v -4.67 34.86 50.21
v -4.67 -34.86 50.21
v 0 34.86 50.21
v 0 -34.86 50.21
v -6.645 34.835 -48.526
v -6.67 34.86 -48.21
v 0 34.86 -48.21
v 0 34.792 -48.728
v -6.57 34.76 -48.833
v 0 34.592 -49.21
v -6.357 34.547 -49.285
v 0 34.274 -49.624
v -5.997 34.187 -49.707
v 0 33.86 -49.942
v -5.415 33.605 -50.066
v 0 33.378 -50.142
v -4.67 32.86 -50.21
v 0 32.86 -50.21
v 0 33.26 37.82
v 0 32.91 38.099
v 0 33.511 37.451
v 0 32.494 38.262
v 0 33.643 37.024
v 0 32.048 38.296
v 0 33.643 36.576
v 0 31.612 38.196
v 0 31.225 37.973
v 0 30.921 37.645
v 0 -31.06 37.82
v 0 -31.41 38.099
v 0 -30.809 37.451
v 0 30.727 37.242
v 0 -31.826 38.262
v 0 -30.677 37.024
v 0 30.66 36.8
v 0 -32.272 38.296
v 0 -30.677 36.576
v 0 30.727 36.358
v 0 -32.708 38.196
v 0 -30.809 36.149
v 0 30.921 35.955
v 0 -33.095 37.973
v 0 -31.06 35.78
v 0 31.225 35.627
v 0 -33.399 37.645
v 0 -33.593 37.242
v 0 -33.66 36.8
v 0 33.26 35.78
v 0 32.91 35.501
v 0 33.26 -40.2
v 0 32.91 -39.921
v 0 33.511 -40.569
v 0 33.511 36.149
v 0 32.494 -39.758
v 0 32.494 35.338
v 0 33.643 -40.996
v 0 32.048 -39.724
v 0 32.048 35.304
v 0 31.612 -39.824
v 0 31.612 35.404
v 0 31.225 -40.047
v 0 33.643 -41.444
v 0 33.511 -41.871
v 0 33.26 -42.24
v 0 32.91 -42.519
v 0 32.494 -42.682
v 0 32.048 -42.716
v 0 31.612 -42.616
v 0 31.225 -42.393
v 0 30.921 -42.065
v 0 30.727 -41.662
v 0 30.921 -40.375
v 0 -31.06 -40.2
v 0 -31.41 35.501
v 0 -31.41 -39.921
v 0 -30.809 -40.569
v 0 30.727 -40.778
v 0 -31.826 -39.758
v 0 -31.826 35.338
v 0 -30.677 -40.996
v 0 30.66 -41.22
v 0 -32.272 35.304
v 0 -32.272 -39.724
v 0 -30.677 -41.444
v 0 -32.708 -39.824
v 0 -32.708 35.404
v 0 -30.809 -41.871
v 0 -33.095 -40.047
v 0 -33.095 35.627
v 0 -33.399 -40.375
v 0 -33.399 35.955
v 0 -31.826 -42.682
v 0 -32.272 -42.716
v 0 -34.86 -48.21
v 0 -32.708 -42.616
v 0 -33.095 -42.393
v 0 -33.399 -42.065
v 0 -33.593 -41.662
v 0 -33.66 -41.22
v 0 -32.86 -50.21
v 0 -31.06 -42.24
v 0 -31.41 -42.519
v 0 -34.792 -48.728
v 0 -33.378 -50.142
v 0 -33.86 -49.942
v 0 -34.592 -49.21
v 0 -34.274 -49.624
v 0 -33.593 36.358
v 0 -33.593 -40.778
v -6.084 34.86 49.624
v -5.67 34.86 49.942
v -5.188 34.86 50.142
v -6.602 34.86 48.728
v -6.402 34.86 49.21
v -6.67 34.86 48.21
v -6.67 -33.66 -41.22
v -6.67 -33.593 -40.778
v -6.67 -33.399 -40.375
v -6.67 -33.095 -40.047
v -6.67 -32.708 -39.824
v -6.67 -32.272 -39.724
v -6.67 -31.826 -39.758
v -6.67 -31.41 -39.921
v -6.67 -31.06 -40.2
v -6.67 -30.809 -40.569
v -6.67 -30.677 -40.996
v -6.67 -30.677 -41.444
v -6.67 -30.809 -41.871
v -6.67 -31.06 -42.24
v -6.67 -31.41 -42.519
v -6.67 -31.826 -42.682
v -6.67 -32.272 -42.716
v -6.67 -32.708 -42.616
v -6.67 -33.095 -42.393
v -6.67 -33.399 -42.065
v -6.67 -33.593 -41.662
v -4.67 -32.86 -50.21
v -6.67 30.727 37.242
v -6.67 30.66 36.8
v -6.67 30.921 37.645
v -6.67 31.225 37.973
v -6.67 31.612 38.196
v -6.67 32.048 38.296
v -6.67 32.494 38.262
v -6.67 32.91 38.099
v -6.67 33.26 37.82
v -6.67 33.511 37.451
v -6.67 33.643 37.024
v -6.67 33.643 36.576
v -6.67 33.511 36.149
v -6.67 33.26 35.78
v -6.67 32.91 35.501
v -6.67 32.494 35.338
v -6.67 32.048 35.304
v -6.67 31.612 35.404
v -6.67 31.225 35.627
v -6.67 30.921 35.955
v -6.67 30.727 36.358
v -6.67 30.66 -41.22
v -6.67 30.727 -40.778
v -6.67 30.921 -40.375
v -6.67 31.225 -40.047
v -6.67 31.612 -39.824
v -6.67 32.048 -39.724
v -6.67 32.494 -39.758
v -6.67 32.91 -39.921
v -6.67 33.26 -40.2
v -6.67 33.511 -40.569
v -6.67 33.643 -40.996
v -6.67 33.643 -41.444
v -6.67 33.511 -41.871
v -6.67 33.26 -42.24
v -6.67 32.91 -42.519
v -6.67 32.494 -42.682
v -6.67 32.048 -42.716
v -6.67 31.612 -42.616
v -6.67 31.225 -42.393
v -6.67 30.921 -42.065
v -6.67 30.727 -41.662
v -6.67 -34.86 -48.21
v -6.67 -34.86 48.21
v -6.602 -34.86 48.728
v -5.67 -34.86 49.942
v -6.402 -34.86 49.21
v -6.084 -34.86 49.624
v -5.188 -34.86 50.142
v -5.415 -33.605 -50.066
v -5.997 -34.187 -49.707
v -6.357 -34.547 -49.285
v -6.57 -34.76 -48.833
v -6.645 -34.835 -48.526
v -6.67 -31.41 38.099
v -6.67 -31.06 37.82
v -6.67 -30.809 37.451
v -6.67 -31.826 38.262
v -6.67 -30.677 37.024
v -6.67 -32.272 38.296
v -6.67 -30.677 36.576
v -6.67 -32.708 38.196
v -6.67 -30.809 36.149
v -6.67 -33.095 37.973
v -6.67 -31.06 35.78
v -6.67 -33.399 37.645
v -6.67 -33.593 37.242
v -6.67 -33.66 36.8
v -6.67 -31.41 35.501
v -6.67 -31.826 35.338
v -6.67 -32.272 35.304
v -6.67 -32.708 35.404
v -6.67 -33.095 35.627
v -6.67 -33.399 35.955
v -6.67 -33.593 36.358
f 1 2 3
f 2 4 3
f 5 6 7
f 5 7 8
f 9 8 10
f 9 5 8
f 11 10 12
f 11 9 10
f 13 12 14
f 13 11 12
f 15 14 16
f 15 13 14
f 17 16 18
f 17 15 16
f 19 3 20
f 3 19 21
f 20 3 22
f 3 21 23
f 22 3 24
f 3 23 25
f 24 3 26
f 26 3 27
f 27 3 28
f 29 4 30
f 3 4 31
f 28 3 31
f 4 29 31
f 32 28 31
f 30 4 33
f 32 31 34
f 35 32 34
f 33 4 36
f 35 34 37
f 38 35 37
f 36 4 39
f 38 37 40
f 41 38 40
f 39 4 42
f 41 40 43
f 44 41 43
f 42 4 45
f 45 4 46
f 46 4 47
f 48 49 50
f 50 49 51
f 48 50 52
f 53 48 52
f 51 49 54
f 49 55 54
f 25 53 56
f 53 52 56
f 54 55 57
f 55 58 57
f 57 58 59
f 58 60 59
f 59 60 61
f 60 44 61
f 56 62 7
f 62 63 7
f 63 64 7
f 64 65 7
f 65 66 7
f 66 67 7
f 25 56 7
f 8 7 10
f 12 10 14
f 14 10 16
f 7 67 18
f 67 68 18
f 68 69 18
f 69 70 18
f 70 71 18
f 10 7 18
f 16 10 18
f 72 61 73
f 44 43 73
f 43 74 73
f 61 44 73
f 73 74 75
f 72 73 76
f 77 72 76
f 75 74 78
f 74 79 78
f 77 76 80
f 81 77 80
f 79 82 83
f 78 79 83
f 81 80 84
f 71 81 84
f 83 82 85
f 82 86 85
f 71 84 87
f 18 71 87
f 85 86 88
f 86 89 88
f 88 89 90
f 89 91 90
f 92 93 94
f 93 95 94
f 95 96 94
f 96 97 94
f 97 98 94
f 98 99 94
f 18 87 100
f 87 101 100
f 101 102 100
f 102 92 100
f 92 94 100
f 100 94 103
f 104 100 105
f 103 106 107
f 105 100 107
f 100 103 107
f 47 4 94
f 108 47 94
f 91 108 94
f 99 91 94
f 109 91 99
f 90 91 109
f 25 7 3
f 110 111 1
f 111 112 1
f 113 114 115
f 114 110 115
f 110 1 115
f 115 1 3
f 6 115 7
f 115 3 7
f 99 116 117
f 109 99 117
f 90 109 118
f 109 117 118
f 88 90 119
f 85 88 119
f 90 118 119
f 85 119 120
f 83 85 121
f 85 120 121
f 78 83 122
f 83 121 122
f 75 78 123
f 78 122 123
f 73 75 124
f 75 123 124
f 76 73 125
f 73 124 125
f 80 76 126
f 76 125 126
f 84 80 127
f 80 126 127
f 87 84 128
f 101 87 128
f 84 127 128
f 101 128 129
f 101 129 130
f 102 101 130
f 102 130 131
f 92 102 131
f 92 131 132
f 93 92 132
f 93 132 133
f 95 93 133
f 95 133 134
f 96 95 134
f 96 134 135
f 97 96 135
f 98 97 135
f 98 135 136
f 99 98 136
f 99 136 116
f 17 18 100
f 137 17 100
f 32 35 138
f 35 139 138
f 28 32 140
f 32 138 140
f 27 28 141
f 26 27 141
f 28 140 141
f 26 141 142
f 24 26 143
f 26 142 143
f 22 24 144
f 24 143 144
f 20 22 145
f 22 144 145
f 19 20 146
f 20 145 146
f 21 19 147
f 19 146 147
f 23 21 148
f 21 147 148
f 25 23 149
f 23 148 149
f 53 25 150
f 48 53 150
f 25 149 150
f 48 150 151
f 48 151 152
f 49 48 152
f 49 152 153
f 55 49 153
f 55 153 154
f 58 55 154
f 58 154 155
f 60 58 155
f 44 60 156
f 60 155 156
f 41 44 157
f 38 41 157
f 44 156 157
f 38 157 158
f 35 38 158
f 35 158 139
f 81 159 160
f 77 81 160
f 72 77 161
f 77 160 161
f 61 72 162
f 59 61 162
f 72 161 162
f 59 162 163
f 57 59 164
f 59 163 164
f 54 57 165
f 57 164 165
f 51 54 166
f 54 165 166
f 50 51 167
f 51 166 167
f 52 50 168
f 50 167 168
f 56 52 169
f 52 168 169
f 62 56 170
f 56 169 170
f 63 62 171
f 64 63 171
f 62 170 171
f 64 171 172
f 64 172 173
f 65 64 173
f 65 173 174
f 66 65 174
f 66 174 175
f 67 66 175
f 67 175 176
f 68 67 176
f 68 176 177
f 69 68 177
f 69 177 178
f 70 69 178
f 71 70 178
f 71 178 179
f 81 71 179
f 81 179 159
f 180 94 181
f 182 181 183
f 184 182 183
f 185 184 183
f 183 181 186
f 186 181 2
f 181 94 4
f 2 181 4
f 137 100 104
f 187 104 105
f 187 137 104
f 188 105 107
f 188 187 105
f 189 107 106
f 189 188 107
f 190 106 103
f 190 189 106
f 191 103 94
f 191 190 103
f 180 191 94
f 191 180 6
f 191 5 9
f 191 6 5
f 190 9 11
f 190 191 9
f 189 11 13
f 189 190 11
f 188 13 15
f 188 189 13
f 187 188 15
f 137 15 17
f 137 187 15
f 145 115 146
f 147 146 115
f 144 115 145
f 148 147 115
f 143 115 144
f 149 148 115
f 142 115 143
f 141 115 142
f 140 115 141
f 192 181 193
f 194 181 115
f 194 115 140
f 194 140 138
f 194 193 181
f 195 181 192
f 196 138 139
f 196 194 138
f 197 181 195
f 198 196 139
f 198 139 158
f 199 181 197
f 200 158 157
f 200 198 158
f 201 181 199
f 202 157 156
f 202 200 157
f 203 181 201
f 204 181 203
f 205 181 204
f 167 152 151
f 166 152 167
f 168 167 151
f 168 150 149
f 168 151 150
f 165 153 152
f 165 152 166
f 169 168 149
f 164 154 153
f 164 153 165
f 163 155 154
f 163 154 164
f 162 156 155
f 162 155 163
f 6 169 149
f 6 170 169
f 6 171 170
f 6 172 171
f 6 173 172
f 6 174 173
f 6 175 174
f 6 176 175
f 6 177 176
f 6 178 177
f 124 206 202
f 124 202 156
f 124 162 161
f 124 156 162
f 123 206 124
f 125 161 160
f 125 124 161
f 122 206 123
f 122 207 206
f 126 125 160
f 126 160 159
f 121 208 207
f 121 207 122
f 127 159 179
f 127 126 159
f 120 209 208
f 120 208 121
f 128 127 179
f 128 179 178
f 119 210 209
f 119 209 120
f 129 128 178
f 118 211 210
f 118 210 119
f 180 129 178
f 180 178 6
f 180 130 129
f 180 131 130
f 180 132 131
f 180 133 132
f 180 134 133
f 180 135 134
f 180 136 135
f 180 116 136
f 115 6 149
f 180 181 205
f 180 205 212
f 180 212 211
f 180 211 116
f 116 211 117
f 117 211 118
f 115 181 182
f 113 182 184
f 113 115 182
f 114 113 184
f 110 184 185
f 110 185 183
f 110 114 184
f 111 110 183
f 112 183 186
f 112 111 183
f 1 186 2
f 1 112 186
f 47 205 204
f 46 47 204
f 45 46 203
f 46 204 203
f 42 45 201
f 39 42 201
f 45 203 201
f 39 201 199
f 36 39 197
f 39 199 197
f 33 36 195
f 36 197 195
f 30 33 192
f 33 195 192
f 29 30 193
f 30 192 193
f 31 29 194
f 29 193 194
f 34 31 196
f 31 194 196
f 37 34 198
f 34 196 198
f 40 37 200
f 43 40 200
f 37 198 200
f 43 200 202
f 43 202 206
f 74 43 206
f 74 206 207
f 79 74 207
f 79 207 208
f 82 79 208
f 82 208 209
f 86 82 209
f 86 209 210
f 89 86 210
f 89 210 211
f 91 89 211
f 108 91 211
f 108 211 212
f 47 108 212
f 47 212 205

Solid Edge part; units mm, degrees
sketch "Sketch1" plane through (0, 0, 0) normal (-1, 0, 0) x (0, -1, 0)
  line L0 (-34.86, -50.21) -> (34.86, -50.21)
  line L1 (34.86, -50.21) -> (34.86, 50.21)
  line L2 (34.86, 50.21) -> (-34.86, 50.21)
  line L3 (-34.86, 50.21) -> (-34.86, -50.21)
  dimension "D1" = 69.72
  dimension "D2" = 100.42
extrude "Protrusion1" add sketch "Sketch1" along normal blind 6.67
sketch "Sketch2" plane through (-6.67, 0, 0) normal (-1, 0, 0) x (0, -1, 0)
  circle A0 centre (-32.16, 36.8) radius 1.5
  circle A1 centre (32.16, 36.8) radius 1.5
  circle A2 centre (-32.16, -41.22) radius 1.5
  circle A3 centre (32.16, -41.22) radius 1.5
  dimension "D1" = 3
  dimension "D2" = 3
  dimension "D3" = 3
extrude "Cutout1" cut sketch "Sketch2" against normal blind 15
fillet "Round_7" radius 2 4 edges at (-6.67, 0, 50.21) (-6.67, 0, -50.21) (-3.335, 34.86, -50.21) (-3.335, -34.86, -50.21)
